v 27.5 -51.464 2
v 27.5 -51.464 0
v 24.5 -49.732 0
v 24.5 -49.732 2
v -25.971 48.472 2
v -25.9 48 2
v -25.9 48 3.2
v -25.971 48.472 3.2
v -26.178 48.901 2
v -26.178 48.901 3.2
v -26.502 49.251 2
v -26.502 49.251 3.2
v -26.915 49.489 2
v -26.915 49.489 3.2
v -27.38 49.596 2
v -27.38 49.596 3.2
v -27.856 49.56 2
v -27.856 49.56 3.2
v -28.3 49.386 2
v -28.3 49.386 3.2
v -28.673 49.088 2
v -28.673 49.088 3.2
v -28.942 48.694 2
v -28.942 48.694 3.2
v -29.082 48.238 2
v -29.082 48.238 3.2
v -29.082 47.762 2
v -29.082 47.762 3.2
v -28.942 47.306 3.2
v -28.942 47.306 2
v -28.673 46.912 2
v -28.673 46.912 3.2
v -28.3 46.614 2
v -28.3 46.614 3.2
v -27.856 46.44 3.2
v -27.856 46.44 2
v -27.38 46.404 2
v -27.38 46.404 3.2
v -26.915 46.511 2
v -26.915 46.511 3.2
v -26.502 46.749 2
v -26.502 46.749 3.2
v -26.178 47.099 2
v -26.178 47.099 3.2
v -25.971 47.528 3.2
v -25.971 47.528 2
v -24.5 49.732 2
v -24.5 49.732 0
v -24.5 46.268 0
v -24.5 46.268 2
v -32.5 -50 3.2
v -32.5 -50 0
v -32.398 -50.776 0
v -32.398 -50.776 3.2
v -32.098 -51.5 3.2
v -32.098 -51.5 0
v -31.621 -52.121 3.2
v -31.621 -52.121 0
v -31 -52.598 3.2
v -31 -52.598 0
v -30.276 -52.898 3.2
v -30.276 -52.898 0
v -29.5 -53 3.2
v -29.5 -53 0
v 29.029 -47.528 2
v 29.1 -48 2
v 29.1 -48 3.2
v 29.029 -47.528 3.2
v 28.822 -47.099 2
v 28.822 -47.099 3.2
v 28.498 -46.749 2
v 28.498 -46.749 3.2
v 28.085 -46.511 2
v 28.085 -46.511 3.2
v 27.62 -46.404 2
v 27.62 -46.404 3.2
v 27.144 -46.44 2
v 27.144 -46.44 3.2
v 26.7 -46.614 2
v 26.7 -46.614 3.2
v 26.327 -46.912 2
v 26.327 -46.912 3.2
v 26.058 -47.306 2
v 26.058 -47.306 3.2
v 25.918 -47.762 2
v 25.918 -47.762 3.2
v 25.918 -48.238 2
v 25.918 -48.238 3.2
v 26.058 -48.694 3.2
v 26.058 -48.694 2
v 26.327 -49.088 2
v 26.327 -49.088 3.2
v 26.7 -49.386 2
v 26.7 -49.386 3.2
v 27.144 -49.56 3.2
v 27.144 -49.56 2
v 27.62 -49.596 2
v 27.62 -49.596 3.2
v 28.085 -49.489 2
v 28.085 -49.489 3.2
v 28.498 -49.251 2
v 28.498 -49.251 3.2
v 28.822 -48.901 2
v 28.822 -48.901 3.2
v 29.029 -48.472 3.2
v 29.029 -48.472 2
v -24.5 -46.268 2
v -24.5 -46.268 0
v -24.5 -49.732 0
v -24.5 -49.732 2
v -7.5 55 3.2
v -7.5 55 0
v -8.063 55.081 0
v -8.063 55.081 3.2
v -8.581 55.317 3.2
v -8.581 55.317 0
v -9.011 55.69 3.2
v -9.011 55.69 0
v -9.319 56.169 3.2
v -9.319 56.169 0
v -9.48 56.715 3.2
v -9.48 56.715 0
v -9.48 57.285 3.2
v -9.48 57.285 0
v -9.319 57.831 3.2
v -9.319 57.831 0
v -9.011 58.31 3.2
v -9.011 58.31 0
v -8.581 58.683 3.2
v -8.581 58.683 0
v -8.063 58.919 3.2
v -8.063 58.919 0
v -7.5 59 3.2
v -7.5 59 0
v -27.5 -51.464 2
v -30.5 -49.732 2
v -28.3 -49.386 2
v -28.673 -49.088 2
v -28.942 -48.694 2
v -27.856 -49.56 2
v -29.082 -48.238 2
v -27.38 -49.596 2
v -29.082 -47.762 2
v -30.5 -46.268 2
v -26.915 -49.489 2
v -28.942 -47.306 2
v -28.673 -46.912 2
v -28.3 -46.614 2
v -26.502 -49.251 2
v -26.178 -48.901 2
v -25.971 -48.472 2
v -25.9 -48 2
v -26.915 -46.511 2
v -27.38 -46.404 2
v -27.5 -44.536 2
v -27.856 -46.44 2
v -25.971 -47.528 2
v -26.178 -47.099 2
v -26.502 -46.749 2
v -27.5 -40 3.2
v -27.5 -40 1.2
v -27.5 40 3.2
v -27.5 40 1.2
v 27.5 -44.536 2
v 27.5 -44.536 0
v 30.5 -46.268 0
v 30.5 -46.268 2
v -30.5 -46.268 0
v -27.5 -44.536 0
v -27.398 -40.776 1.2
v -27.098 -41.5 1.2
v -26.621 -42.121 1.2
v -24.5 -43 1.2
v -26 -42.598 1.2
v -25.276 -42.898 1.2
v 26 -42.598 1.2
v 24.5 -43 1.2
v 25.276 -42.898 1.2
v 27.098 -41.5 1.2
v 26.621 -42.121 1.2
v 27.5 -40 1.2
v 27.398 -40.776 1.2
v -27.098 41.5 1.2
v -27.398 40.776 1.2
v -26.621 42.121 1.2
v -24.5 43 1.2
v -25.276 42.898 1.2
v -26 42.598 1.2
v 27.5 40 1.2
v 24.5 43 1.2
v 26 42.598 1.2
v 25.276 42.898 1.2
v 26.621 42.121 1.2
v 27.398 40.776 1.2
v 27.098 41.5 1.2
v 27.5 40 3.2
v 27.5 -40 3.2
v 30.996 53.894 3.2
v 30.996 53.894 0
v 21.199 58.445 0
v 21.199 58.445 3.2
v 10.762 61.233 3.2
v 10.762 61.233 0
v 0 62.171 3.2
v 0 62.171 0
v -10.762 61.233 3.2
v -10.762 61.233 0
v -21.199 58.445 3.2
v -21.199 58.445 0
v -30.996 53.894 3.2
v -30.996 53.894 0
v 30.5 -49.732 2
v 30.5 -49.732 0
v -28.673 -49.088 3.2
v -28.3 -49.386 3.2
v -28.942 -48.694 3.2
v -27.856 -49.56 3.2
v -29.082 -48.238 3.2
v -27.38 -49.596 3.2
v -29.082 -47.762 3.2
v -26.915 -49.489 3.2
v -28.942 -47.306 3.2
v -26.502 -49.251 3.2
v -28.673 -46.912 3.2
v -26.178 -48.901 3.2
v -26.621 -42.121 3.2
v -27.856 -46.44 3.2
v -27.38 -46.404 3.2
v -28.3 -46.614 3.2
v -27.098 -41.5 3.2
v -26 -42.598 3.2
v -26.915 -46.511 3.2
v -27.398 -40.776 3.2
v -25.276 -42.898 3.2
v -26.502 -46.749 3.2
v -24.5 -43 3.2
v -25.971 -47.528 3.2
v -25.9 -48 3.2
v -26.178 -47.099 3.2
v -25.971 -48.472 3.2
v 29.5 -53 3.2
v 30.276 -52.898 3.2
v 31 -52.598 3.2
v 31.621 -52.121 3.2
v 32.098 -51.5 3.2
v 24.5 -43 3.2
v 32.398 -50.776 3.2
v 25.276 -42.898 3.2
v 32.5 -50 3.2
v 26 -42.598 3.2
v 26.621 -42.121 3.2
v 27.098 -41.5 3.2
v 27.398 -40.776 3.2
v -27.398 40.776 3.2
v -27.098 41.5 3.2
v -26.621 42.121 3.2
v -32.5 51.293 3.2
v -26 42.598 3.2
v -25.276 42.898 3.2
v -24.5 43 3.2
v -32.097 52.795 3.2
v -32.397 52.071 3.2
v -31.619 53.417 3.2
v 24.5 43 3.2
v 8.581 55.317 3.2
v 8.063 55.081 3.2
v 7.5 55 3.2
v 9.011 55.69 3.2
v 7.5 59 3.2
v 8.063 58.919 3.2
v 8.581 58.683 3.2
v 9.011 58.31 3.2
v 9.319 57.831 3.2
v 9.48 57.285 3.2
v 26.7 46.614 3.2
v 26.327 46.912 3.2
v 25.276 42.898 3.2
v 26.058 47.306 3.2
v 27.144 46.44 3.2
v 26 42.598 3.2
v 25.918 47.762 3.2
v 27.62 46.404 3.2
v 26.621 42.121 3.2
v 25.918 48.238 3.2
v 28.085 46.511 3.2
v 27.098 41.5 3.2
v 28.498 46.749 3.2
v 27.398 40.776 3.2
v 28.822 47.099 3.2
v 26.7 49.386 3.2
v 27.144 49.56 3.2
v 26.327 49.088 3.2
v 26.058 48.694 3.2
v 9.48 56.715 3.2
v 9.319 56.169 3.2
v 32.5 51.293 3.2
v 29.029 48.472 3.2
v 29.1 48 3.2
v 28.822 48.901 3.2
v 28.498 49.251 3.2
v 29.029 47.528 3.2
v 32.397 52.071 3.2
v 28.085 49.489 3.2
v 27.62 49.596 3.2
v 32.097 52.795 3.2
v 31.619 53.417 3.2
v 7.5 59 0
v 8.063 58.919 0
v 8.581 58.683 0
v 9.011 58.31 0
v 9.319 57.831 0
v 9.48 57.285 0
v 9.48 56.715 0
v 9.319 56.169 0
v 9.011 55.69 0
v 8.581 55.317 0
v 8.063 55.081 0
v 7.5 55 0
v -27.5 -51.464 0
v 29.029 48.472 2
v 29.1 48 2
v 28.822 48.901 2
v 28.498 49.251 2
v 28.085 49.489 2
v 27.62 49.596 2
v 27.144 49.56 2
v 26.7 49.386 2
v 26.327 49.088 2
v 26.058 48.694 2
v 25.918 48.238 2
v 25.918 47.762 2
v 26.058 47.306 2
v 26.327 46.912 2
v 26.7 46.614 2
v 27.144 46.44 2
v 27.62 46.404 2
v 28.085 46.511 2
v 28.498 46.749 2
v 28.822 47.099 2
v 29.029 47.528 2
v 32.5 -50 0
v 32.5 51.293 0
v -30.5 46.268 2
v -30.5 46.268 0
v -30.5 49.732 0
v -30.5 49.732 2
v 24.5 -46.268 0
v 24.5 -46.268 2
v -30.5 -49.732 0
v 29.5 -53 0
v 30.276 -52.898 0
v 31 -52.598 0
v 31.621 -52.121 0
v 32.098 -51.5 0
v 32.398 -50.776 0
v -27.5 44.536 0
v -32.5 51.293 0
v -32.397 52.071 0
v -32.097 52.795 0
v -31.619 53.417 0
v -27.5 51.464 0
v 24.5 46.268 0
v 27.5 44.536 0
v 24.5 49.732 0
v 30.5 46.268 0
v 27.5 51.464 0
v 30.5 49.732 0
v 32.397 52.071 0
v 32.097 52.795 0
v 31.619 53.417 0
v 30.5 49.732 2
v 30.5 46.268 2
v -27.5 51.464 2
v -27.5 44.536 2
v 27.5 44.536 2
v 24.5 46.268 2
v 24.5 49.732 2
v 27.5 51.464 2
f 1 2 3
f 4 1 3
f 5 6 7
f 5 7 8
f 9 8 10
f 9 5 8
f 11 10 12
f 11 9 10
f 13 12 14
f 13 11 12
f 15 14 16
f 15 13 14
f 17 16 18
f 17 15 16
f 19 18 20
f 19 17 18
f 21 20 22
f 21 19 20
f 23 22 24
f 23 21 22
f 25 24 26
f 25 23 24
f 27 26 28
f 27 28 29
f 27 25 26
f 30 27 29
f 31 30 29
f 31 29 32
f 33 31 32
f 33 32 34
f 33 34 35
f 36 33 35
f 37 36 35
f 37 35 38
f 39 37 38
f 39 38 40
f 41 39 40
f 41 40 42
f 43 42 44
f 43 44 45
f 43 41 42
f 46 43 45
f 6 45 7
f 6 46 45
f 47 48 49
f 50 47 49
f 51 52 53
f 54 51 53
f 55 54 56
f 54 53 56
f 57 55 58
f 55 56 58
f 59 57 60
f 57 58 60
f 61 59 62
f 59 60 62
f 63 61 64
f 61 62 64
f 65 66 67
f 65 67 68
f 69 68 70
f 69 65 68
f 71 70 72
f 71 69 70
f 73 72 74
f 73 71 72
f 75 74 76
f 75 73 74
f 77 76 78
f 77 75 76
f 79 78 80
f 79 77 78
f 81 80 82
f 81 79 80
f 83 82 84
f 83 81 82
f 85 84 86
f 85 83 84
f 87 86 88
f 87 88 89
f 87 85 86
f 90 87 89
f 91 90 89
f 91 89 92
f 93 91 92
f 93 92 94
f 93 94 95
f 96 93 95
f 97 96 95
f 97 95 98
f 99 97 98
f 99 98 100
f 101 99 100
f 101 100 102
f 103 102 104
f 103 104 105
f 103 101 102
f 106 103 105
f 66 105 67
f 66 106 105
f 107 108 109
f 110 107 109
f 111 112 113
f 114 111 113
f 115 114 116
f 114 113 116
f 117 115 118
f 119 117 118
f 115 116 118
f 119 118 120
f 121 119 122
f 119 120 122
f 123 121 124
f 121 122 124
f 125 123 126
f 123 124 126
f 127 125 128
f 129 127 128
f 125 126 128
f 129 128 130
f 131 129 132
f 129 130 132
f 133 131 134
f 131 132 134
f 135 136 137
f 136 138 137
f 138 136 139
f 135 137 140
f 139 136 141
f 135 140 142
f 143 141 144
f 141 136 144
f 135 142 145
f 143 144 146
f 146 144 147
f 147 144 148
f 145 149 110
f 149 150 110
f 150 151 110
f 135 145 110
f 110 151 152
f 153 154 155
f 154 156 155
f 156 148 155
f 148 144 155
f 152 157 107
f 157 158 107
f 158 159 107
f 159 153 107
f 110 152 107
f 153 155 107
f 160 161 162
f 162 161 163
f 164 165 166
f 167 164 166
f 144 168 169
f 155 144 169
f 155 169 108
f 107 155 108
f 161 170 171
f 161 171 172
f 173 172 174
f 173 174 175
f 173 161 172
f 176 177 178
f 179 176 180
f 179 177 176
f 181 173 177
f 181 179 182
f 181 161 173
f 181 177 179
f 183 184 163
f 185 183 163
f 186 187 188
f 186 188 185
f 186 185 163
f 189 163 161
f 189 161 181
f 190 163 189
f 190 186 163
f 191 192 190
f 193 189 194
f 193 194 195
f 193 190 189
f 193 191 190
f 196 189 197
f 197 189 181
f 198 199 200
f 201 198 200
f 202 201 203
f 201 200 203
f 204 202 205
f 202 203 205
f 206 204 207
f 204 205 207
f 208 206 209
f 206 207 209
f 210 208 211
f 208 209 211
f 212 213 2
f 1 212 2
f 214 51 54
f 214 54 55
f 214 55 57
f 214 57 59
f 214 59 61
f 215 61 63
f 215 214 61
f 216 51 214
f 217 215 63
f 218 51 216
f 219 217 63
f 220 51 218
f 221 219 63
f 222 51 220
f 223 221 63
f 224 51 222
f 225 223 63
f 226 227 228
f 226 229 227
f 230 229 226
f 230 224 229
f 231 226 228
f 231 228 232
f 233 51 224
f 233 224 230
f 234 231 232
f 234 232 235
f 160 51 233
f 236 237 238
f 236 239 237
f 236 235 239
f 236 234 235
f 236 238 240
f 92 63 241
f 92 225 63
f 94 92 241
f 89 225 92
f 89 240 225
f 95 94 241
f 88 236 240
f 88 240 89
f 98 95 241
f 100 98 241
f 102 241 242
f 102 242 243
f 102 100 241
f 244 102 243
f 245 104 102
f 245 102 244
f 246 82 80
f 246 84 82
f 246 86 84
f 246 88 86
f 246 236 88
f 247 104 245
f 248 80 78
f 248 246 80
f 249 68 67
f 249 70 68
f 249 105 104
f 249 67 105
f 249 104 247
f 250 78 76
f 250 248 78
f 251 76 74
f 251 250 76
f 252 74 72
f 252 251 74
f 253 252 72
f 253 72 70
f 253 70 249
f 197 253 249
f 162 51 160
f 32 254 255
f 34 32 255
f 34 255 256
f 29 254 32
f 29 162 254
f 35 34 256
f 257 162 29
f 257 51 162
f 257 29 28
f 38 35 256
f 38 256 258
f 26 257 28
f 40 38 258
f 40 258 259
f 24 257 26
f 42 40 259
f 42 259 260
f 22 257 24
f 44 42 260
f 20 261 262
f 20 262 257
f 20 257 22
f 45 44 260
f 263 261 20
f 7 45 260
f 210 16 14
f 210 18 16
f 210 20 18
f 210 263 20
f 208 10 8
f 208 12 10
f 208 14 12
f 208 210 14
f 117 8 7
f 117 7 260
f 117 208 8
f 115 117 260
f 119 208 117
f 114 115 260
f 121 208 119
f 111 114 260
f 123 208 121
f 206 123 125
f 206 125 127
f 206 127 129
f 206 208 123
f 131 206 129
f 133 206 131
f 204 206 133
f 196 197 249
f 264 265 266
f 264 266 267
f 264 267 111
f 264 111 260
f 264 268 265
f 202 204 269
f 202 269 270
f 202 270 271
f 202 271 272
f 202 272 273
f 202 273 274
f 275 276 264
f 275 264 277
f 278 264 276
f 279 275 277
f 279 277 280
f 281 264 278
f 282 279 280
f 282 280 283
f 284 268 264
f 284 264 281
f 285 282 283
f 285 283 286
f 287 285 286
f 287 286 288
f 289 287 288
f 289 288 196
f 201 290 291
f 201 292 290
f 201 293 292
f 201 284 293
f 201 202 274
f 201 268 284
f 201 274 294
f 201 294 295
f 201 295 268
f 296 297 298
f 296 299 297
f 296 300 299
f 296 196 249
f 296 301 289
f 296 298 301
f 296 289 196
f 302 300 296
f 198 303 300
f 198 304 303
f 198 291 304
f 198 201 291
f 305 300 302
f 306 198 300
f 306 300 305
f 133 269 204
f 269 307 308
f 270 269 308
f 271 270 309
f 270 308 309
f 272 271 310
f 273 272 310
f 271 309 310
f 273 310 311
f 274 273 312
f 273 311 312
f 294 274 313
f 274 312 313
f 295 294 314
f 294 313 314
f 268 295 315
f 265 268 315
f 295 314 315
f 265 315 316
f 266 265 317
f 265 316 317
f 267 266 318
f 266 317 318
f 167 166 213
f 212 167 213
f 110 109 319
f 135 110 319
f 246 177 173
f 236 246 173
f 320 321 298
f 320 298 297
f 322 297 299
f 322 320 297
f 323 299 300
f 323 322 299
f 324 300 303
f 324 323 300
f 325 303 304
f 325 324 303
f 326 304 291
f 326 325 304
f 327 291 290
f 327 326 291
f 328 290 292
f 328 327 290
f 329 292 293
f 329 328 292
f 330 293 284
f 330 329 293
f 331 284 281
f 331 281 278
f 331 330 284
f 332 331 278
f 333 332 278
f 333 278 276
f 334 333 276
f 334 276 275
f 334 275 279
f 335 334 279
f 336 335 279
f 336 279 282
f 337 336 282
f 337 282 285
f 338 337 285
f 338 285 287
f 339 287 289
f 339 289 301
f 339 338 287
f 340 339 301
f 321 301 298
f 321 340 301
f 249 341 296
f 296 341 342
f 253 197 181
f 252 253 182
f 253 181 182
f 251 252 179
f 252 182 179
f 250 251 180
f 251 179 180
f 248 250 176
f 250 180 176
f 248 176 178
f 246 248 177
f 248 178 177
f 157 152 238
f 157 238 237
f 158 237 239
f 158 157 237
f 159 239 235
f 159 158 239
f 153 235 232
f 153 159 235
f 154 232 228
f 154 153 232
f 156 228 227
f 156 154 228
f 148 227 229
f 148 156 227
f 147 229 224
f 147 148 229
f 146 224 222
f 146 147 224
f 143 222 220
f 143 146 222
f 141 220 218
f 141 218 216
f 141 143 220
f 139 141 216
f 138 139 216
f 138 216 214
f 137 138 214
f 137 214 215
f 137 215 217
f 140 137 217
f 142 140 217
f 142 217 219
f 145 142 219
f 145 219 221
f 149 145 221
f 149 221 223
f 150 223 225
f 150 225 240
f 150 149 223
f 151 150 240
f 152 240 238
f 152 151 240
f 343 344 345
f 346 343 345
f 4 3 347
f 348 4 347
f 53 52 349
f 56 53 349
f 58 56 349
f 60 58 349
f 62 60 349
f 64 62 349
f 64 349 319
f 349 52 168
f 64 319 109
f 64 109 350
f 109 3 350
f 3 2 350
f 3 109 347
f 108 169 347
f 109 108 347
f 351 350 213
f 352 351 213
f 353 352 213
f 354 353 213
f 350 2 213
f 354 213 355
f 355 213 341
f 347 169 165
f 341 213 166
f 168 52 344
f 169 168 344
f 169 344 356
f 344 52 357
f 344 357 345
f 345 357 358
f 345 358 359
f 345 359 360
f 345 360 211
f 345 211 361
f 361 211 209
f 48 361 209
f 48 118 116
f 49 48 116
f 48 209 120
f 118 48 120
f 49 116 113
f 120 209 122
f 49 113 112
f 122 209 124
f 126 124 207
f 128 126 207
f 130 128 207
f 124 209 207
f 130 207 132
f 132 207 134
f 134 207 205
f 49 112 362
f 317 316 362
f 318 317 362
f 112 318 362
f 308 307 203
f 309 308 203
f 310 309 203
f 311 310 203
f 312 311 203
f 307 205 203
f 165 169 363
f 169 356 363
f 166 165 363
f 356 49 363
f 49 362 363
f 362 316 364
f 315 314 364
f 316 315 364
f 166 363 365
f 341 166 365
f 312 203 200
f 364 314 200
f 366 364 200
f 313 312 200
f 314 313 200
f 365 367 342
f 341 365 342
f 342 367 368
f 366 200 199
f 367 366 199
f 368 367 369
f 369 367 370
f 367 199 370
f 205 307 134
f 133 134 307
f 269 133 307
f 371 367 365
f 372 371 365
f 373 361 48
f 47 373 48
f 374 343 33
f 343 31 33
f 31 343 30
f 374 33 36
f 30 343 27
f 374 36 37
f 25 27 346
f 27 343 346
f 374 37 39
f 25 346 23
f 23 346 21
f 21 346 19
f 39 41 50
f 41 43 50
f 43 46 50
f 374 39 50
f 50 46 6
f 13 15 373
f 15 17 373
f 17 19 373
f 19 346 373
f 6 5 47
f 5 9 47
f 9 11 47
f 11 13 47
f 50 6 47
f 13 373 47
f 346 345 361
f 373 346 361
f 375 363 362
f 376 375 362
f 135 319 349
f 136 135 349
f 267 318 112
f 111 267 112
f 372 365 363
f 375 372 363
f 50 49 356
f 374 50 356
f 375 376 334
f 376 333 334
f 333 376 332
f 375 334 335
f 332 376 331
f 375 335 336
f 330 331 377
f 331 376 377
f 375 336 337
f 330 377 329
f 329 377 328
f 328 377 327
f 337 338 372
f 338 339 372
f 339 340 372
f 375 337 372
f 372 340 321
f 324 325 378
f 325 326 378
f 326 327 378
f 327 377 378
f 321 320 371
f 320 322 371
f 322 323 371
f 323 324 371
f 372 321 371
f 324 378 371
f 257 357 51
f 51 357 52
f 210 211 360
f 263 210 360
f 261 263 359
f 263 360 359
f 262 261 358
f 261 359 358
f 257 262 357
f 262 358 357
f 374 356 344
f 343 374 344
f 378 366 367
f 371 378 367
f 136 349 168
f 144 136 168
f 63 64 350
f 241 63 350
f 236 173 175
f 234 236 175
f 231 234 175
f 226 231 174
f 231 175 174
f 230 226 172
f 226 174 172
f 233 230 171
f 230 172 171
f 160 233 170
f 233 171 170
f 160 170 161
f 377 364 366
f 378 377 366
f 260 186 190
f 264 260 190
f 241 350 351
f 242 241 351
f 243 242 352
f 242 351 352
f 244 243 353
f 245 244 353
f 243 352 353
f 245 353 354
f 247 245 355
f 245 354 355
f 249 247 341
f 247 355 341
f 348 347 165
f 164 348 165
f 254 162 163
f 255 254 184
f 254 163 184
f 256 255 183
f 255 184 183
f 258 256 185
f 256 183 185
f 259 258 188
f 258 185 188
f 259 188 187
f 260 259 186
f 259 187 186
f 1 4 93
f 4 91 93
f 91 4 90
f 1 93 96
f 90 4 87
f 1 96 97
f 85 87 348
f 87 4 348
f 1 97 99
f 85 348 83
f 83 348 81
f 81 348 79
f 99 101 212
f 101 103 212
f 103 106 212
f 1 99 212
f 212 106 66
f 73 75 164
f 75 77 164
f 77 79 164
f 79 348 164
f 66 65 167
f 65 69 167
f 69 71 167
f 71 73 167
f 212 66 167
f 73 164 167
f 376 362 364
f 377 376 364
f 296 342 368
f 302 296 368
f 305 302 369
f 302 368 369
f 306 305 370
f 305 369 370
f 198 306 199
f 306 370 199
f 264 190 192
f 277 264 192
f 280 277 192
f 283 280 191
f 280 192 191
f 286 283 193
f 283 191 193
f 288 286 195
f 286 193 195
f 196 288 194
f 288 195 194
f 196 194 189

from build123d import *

# Parameters (mm, degrees)
F1_DEPTH = 3.2
F2_DEPTH = 1.2
F3_START = 2
F0_R     = 1.6
F3_DEPTH = 1.2


with BuildPart() as f1:
    # F0 (on Top) → F1 (new body)
    with BuildSketch(Plane.XY):
        with BuildLine():
            Line((-32.5, 51.2930130847), (-32.5, 48))
            Line((-32.5, 48), (-32.5, -48))
            Line((-32.5, -48), (-32.5, -50))
            ThreePointArc((-32.5, -50), (-31.6213203436, -52.1213203436), (-29.5, -53))
            Line((-29.5, -53), (29.5, -53))
            ThreePointArc((29.5, -53), (31.6213203436, -52.1213203436), (32.5, -50))
            Line((32.5, -50), (32.5, -48))
            Line((32.5, -48), (32.5, 48))
            Line((32.5, 48), (32.5, 51.2930130847))
            ThreePointArc((32.5, 51.2930130847), (32.0968235498, 52.7951806689), (30.9956616994, 53.8935891904))
            ThreePointArc((30.9956616994, 53.8935891904), (0, 62.1711347813), (-30.9956616994, 53.8935891904))
            ThreePointArc((-30.9956616994, 53.8935891904), (-32.0968235498, 52.7951806689), (-32.5, 51.2930130847))
        make_face()
        Polygon((-27.5, -44.5358983849), (-24.5, -46.2679491924), (-24.5, -49.7320508076), (-27.5, -51.4641016151), (-30.5, -49.7320508076), (-30.5, -46.2679491924), align=None, mode=Mode.SUBTRACT)
        Polygon((27.5, -51.4641016151), (24.5, -49.7320508076), (24.5, -46.2679491924), (27.5, -44.5358983849), (30.5, -46.2679491924), (30.5, -49.7320508076), align=None, mode=Mode.SUBTRACT)
        with BuildLine():
            ThreePointArc((-27.5, 40), (-26.6213203436, 42.1213203436), (-24.5, 43))
            Line((-24.5, 43), (24.5, 43))
            ThreePointArc((24.5, 43), (26.6213203436, 42.1213203436), (27.5, 40))
            Line((27.5, 40), (27.5, -40))
            ThreePointArc((27.5, -40), (26.6213203436, -42.1213203436), (24.5, -43))
            Line((24.5, -43), (-24.5, -43))
            ThreePointArc((-24.5, -43), (-26.6213203436, -42.1213203436), (-27.5, -40))
            Line((-27.5, -40), (-27.5, 40))
        make_face(mode=Mode.SUBTRACT)
        Polygon((-27.5, 51.4641016151), (-24.5, 49.7320508076), (-24.5, 46.2679491924), (-27.5, 44.5358983849), (-30.5, 46.2679491924), (-30.5, 49.7320508076), align=None, mode=Mode.SUBTRACT)
        with BuildLine():
            ThreePointArc((-7.4999998324, 55), (-9.4999998324, 57), (-7.4999998324, 59))
            Line((-7.4999998324, 59), (7.5000001676, 59))
            ThreePointArc((7.5000001676, 59), (9.5000001676, 57), (7.5000001676, 55))
            Line((7.5000001676, 55), (-7.4999998324, 55))
        make_face(mode=Mode.SUBTRACT)
        Polygon((27.5, 44.5358983849), (24.5, 46.2679491924), (24.5, 49.7320508076), (27.5, 51.4641016151), (30.5, 49.7320508076), (30.5, 46.2679491924), align=None, mode=Mode.SUBTRACT)
    extrude(amount=F1_DEPTH)

    # F0 (on Top) → F2 (join)
    with BuildSketch(Plane.XY):
        with BuildLine():
            Line((24.5, 43), (-24.5, 43))
            ThreePointArc((-24.5, 43), (-26.6213203436, 42.1213203436), (-27.5, 40))
            Line((-27.5, 40), (-27.5, -40))
            ThreePointArc((-27.5, -40), (-26.6213203436, -42.1213203436), (-24.5, -43))
            Line((-24.5, -43), (24.5, -43))
            ThreePointArc((24.5, -43), (26.6213203436, -42.1213203436), (27.5, -40))
            Line((27.5, -40), (27.5, 40))
            ThreePointArc((27.5, 40), (26.6213203436, 42.1213203436), (24.5, 43))
        make_face()
    extrude(amount=F2_DEPTH)

    # F0 (on Top) → F3 (join)
    with BuildSketch(Plane.XY.offset(F3_START)):
        Polygon((-24.5, -49.7320508076), (-24.5, -46.2679491924), (-27.5, -44.5358983849), (-30.5, -46.2679491924), (-30.5, -49.7320508076), (-27.5, -51.4641016151), align=None)
        with Locations((-27.5, -48)):
            Circle(F0_R, mode=Mode.SUBTRACT)
        Polygon((24.5, -46.2679491924), (24.5, -49.7320508076), (27.5, -51.4641016151), (30.5, -49.7320508076), (30.5, -46.2679491924), (27.5, -44.5358983849), align=None)
        with Locations((27.5, -48)):
            Circle(F0_R, mode=Mode.SUBTRACT)
        Polygon((24.5, 49.7320508076), (24.5, 46.2679491924), (27.5, 44.5358983849), (30.5, 46.2679491924), (30.5, 49.7320508076), (27.5, 51.4641016151), align=None)
        with Locations((27.5, 48)):
            Circle(F0_R, mode=Mode.SUBTRACT)
        Polygon((-24.5, 46.2679491924), (-24.5, 49.7320508076), (-27.5, 51.4641016151), (-30.5, 49.7320508076), (-30.5, 46.2679491924), (-27.5, 44.5358983849), align=None)
        with Locations((-27.5, 48)):
            Circle(F0_R, mode=Mode.SUBTRACT)
    extrude(amount=F3_DEPTH)


solid = f1.part
